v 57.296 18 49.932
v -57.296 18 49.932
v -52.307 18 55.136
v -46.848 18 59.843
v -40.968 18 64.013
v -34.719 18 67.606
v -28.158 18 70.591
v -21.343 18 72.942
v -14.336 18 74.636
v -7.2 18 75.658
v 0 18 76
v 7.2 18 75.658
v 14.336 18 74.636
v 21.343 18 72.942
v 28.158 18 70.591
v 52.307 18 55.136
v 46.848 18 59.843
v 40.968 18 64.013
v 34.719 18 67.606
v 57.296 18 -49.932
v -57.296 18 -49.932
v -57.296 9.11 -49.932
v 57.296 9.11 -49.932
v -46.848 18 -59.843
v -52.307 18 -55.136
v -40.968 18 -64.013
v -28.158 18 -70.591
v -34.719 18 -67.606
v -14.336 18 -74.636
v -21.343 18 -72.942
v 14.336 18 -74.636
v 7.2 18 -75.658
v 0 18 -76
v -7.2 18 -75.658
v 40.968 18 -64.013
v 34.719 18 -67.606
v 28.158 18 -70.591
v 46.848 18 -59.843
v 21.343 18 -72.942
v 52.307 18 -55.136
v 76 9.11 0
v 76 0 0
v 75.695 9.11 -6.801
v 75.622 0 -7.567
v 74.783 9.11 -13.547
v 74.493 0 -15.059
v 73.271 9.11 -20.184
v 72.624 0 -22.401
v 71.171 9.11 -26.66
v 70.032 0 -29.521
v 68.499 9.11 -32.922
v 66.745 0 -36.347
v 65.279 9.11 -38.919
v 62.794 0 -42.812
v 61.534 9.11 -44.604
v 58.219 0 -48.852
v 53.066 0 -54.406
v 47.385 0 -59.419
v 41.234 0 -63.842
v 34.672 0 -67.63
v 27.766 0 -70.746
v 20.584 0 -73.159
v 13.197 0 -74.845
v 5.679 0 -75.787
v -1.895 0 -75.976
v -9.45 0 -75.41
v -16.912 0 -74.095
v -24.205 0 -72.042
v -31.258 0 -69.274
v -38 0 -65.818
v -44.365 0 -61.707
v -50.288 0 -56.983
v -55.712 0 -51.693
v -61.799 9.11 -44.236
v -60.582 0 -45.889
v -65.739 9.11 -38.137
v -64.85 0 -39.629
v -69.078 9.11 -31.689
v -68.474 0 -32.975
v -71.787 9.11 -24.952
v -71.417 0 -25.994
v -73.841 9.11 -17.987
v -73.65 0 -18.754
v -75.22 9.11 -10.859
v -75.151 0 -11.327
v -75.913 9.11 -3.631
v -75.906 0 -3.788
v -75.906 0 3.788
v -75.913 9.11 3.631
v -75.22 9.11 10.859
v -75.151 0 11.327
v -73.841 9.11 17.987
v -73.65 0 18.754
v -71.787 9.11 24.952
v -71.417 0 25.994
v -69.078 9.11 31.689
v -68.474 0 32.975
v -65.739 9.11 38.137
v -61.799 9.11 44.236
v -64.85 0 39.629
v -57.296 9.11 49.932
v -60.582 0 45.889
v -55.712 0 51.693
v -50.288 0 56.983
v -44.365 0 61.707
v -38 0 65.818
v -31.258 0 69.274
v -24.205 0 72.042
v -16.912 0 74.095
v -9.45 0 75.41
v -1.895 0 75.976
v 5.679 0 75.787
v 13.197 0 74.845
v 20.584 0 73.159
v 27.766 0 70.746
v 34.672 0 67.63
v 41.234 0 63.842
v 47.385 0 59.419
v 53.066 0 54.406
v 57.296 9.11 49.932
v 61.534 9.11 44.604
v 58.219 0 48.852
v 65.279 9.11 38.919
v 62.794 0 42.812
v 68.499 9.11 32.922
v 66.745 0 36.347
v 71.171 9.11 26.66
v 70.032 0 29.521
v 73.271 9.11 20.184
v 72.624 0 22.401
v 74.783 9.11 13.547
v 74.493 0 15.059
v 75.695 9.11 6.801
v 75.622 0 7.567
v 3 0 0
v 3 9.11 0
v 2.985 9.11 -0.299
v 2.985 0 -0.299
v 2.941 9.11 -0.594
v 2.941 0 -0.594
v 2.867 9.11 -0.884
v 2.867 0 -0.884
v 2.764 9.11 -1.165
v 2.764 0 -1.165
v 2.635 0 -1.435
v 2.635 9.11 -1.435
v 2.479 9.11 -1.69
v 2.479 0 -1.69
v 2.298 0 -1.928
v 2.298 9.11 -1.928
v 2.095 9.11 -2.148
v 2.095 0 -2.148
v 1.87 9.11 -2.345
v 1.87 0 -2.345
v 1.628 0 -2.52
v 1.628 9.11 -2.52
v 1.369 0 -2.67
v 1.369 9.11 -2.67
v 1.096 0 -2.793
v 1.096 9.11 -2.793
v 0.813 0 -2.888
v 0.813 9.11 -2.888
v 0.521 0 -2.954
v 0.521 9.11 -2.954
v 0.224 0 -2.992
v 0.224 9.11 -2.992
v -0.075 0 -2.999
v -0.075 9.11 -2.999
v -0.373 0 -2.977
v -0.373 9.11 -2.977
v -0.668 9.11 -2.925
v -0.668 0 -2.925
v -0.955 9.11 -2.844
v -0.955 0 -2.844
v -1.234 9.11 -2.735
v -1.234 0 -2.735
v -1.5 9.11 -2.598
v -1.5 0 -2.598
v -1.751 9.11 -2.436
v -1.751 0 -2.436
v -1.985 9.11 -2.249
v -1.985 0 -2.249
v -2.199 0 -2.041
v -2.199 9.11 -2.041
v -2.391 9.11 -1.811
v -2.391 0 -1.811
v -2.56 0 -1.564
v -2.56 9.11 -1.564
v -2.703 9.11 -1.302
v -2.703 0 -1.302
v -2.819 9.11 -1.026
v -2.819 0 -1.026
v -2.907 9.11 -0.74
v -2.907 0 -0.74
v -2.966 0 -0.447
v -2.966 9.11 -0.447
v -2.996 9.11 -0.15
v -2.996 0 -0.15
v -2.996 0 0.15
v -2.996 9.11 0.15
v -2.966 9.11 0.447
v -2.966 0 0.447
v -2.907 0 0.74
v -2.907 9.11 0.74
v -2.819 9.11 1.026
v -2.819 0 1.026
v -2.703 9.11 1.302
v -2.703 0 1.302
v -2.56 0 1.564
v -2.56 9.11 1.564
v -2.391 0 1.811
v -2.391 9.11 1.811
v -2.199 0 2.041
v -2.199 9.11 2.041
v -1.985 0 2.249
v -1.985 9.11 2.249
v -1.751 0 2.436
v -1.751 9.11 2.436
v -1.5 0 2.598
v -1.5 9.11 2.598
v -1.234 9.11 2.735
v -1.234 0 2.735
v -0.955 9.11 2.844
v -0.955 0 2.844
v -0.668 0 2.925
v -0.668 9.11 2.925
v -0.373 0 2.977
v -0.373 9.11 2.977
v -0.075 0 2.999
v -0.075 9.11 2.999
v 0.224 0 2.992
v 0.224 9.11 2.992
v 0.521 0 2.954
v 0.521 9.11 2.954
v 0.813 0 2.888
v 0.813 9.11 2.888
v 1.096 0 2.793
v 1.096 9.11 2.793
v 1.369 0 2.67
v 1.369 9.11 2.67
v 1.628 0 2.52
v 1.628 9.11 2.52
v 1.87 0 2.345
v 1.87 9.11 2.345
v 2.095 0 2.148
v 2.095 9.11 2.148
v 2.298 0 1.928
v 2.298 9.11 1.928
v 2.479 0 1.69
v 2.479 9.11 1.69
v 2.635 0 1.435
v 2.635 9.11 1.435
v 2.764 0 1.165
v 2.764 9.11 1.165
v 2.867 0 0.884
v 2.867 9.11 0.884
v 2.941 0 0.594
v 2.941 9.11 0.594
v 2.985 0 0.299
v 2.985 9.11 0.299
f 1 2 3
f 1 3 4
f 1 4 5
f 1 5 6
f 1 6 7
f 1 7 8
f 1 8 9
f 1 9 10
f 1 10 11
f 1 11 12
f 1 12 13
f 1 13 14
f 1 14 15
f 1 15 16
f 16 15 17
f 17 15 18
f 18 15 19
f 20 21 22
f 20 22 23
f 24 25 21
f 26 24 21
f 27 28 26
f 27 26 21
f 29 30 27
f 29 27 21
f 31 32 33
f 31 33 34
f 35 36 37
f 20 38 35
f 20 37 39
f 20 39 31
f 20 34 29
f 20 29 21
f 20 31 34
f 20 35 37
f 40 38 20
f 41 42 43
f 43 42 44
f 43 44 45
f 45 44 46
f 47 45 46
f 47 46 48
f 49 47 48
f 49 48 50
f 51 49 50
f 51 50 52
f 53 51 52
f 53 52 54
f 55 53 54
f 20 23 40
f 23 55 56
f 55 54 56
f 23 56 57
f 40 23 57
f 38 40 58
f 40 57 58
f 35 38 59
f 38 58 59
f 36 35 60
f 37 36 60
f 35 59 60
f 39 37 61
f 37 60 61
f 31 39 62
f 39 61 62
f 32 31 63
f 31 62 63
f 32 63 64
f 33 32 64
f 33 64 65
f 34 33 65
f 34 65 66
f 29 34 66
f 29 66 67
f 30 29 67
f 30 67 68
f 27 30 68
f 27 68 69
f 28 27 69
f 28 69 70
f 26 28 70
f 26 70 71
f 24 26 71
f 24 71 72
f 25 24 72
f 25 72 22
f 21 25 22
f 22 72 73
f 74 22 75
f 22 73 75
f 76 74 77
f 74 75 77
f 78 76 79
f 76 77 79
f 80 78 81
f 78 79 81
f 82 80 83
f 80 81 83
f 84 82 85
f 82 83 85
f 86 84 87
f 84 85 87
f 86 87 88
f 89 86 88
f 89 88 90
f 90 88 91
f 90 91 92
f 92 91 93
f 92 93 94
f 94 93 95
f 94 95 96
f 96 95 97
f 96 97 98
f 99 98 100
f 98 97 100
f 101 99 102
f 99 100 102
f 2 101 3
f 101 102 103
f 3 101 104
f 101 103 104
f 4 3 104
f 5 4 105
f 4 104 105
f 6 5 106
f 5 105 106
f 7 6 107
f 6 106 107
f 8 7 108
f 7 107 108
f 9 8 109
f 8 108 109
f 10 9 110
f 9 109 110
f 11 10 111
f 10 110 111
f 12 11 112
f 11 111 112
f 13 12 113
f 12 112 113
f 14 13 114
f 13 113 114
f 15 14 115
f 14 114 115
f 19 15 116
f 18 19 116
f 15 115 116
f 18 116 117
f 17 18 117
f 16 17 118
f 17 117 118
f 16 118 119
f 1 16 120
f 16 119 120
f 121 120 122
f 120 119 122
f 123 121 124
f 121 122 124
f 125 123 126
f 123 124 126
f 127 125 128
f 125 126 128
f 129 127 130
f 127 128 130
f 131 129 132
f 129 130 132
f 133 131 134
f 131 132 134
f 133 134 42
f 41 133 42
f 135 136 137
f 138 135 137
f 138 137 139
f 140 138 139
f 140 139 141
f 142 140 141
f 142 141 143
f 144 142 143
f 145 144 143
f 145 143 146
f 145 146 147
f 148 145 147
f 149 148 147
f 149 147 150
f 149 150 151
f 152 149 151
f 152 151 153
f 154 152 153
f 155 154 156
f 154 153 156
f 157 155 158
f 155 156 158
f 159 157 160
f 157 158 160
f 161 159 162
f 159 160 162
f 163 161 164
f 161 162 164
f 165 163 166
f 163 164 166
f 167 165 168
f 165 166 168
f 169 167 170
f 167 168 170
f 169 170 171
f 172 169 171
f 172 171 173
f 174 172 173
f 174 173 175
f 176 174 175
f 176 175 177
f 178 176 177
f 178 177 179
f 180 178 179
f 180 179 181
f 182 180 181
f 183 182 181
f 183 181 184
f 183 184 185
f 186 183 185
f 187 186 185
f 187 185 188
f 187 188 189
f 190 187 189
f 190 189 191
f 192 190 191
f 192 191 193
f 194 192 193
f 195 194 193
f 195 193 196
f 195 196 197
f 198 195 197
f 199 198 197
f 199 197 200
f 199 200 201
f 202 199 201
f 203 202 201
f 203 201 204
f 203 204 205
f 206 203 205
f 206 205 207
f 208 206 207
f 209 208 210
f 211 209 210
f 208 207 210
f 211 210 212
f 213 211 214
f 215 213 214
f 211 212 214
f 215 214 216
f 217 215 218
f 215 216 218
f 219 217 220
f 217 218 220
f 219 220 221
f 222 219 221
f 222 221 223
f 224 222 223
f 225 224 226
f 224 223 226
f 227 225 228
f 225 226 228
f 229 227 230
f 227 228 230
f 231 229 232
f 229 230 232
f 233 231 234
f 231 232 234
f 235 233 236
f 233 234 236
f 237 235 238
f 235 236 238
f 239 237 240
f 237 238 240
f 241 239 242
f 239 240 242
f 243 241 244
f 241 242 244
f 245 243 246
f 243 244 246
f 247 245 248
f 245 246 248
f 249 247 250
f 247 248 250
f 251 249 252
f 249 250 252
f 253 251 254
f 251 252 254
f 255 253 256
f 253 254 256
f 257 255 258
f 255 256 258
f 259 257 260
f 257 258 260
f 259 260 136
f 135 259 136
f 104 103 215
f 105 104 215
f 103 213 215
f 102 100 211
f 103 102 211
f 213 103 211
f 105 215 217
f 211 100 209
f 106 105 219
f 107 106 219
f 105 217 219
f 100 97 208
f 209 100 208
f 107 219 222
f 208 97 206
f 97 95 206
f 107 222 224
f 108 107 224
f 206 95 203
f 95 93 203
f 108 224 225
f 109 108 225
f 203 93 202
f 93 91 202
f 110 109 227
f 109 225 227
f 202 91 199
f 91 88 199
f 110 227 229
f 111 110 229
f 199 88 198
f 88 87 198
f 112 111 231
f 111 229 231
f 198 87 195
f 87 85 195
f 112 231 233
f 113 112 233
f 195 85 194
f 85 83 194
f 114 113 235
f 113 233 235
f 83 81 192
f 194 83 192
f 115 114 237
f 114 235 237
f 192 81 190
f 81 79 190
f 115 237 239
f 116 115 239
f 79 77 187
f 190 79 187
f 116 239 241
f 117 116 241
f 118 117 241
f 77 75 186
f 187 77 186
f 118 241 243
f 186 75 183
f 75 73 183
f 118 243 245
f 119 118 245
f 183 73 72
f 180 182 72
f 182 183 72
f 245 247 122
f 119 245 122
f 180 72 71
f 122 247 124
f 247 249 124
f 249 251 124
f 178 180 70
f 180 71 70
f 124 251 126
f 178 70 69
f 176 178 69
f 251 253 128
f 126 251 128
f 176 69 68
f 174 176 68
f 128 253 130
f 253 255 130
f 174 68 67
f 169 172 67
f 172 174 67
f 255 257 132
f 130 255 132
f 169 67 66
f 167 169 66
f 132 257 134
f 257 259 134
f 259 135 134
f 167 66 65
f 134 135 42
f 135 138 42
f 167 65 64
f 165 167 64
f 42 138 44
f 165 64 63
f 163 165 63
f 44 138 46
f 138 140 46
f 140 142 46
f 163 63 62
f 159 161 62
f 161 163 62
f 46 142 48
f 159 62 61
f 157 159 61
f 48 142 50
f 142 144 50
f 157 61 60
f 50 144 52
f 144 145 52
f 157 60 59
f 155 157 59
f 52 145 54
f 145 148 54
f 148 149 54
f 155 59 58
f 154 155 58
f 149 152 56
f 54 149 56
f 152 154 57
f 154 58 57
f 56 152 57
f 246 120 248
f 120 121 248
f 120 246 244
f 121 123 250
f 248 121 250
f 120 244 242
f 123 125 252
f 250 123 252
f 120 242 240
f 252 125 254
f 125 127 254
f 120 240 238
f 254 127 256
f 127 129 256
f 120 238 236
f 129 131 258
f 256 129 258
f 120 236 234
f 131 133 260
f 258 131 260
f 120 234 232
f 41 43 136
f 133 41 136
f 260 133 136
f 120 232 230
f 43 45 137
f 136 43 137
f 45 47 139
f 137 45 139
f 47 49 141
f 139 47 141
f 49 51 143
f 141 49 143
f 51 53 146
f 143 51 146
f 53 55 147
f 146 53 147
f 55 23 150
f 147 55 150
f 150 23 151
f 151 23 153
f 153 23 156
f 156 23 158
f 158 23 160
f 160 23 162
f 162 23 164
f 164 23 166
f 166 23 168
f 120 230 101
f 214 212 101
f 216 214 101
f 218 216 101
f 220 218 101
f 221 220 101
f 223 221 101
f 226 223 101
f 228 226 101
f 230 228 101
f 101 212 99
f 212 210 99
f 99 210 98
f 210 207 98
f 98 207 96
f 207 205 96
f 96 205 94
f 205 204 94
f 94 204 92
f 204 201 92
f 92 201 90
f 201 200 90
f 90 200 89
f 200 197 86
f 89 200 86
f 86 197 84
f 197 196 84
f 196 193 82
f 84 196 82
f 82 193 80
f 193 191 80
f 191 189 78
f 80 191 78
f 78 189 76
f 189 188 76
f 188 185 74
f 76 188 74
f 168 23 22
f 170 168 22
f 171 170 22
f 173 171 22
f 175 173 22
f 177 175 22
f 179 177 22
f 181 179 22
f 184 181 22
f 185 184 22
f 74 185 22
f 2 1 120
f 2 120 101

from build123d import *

# Parameters (mm, degrees)
SKETCH1_R           = 76
BOSS_EXTRUDE1_DEPTH = 18
CUT_EXTRUDE4_DEPTH  = 8.89
SKETCH5_R           = 3
CUT_EXTRUDE5_DEPTH  = 20


with BuildPart() as part:
    # Sketch1 → Boss-Extrude1 (new body)
    with BuildSketch(Plane(origin=(0, 0, 0), x_dir=(1, 0, 0), z_dir=(0, 1, 0))):
        Circle(SKETCH1_R)
    extrude(amount=BOSS_EXTRUDE1_DEPTH)

    # Sketch2 → Cut-Extrude4 (cut)
    with BuildSketch(Plane(origin=(0, 18, 0), x_dir=(1, 0, 0), z_dir=(0, 1, 0))):
        with BuildLine():
            Line((-58.007955522, 49.931796385), (58.007955522, 49.931796385))
            ThreePointArc((58.007955522, 49.931796385), (107.939751907, 0), (58.007955522, -49.931796385))
            Line((58.007955522, -49.931796385), (-58.007955522, -49.931796385))
            ThreePointArc((-58.007955522, -49.931796385), (-107.939751907, 0), (-58.007955522, 49.931796385))
        make_face()
    extrude(amount=-CUT_EXTRUDE4_DEPTH, mode=Mode.SUBTRACT)

    # Sketch5 → Cut-Extrude5 (cut)
    with BuildSketch(Plane(origin=(0, 9.11, 0), x_dir=(1, 0, 0), z_dir=(0, 1, 0))):
        Circle(SKETCH5_R)
    extrude(amount=-CUT_EXTRUDE5_DEPTH, mode=Mode.SUBTRACT)


solid = part.part
